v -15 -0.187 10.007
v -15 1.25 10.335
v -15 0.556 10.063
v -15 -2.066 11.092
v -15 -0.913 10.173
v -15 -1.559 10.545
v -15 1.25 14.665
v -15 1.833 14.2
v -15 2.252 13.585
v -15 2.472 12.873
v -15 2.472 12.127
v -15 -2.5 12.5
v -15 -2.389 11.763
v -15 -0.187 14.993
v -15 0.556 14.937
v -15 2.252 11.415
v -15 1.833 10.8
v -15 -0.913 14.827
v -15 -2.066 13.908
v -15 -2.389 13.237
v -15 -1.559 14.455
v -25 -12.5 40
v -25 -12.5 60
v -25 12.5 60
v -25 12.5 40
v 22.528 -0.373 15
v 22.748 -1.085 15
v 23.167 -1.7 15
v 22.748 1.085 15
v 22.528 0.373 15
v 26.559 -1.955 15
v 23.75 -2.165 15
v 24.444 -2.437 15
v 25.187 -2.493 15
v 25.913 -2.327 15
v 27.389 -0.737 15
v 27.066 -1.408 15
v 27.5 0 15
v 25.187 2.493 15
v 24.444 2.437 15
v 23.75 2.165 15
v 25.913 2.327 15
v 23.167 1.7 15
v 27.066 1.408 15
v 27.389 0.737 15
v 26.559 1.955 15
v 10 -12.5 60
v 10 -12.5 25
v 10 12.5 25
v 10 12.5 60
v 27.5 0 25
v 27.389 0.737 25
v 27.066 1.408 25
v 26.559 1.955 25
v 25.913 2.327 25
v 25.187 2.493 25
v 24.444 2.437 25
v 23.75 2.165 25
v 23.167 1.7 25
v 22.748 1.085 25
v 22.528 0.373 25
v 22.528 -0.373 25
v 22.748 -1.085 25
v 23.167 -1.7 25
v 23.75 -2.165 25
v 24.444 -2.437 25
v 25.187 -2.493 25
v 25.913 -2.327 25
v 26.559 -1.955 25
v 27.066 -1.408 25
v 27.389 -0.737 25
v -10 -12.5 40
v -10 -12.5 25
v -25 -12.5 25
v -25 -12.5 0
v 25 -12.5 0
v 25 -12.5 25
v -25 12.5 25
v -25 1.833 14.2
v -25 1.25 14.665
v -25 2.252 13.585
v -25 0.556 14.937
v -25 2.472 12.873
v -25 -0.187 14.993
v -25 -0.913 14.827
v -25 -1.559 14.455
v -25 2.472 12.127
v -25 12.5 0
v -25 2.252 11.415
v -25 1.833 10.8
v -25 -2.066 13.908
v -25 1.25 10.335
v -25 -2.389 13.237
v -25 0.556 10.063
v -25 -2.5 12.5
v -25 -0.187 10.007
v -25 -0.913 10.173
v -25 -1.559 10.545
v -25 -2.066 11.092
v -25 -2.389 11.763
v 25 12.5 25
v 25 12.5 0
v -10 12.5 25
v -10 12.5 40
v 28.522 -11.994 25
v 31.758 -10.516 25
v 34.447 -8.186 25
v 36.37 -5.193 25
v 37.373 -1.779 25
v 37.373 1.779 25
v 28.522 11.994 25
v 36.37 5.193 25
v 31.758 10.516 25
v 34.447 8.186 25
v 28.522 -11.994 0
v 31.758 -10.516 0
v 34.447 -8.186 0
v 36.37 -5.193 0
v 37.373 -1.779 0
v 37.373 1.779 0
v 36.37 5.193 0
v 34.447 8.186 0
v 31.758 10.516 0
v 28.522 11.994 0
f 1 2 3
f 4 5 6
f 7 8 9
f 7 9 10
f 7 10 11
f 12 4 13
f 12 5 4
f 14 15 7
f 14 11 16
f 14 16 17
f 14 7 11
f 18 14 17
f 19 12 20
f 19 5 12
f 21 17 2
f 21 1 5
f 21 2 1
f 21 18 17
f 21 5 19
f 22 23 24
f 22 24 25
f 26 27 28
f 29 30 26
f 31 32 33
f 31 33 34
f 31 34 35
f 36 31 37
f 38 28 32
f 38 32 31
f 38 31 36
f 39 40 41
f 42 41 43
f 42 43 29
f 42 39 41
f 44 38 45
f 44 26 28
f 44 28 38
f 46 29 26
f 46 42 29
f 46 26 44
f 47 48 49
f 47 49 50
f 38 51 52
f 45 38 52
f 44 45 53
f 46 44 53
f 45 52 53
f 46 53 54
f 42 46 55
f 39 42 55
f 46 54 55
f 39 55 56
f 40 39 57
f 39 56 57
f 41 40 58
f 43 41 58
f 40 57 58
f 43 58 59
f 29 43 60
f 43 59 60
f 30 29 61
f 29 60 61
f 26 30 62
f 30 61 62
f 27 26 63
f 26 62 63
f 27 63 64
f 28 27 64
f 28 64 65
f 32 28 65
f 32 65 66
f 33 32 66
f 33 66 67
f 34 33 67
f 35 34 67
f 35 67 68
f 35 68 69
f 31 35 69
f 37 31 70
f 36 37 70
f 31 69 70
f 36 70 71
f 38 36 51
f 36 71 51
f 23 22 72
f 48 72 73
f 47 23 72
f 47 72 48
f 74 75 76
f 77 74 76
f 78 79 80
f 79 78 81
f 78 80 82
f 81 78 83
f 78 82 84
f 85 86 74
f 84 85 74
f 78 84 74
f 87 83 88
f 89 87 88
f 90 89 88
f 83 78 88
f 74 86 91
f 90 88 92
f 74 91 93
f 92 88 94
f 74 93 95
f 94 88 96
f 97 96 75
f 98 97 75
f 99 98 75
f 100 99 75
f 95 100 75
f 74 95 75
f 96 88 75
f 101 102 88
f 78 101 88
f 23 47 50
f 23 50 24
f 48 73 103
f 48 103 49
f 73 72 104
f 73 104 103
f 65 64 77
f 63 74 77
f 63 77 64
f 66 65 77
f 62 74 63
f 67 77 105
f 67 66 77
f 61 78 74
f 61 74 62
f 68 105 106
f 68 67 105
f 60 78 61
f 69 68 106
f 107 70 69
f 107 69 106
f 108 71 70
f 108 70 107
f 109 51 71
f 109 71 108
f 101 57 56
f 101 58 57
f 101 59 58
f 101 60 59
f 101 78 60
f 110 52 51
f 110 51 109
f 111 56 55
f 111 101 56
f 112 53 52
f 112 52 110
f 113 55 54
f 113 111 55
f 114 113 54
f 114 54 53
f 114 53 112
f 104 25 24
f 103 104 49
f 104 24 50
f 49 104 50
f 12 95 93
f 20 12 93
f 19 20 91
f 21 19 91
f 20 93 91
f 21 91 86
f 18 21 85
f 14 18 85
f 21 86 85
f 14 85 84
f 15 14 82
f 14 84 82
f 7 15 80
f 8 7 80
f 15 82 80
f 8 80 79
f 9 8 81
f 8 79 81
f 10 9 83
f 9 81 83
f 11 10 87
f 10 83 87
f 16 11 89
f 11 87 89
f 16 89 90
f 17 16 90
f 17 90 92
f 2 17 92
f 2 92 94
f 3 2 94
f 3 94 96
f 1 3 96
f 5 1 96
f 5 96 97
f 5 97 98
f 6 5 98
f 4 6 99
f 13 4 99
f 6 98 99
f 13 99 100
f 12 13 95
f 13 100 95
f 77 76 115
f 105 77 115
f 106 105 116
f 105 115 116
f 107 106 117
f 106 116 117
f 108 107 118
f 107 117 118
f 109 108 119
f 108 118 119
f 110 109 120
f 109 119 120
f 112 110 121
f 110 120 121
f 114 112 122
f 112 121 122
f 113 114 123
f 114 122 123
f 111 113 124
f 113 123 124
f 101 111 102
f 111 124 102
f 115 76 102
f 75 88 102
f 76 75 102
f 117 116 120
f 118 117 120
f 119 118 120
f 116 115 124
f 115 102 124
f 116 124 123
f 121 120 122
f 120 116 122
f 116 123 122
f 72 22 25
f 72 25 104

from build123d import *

# Parameters (mm, degrees)
F1_DEPTH = 25
F2_R     = 2.5
F3_DEPTH = 10
F4_R     = 2.5
F5_DEPTH = 10
F7_DEPTH = 25


with BuildPart() as f1:
    # F0 (on Top) → F1 (new body)
    with BuildSketch(Plane.XY):
        with BuildLine():
            ThreePointArc((25, -12.5), (37.5, 0), (25, 12.5))
            Line((25, 12.5), (-25, 12.5))
            Line((-25, 12.5), (-25, -12.5))
            Line((-25, -12.5), (25, -12.5))
        make_face()
    extrude(amount=F1_DEPTH)

    # F2 (on face) → F3 (cut)
    with BuildSketch(Plane.XY.offset(25)):
        with Locations((25, 0)):
            Circle(F2_R)
    extrude(amount=-F3_DEPTH, mode=Mode.SUBTRACT)

    # F4 (on face) → F5 (cut)
    with BuildSketch(Plane(origin=(-25, 0, 0), x_dir=(0, -1, 0), z_dir=(-1, 0, 0))):
        with Locations((0, 12.5)):
            Circle(F4_R)
    extrude(amount=-F5_DEPTH, mode=Mode.SUBTRACT)


with BuildPart() as f7:
    # F6 (on face) → F7 (new body)
    with BuildSketch(Plane.XZ.offset(12.5)):
        Polygon((-10, 40), (-10, 25), (10, 25), (10, 60), (-25, 60), (-25, 40), align=None)
    extrude(amount=-F7_DEPTH)


solid = Compound([f1.part, f7.part])
